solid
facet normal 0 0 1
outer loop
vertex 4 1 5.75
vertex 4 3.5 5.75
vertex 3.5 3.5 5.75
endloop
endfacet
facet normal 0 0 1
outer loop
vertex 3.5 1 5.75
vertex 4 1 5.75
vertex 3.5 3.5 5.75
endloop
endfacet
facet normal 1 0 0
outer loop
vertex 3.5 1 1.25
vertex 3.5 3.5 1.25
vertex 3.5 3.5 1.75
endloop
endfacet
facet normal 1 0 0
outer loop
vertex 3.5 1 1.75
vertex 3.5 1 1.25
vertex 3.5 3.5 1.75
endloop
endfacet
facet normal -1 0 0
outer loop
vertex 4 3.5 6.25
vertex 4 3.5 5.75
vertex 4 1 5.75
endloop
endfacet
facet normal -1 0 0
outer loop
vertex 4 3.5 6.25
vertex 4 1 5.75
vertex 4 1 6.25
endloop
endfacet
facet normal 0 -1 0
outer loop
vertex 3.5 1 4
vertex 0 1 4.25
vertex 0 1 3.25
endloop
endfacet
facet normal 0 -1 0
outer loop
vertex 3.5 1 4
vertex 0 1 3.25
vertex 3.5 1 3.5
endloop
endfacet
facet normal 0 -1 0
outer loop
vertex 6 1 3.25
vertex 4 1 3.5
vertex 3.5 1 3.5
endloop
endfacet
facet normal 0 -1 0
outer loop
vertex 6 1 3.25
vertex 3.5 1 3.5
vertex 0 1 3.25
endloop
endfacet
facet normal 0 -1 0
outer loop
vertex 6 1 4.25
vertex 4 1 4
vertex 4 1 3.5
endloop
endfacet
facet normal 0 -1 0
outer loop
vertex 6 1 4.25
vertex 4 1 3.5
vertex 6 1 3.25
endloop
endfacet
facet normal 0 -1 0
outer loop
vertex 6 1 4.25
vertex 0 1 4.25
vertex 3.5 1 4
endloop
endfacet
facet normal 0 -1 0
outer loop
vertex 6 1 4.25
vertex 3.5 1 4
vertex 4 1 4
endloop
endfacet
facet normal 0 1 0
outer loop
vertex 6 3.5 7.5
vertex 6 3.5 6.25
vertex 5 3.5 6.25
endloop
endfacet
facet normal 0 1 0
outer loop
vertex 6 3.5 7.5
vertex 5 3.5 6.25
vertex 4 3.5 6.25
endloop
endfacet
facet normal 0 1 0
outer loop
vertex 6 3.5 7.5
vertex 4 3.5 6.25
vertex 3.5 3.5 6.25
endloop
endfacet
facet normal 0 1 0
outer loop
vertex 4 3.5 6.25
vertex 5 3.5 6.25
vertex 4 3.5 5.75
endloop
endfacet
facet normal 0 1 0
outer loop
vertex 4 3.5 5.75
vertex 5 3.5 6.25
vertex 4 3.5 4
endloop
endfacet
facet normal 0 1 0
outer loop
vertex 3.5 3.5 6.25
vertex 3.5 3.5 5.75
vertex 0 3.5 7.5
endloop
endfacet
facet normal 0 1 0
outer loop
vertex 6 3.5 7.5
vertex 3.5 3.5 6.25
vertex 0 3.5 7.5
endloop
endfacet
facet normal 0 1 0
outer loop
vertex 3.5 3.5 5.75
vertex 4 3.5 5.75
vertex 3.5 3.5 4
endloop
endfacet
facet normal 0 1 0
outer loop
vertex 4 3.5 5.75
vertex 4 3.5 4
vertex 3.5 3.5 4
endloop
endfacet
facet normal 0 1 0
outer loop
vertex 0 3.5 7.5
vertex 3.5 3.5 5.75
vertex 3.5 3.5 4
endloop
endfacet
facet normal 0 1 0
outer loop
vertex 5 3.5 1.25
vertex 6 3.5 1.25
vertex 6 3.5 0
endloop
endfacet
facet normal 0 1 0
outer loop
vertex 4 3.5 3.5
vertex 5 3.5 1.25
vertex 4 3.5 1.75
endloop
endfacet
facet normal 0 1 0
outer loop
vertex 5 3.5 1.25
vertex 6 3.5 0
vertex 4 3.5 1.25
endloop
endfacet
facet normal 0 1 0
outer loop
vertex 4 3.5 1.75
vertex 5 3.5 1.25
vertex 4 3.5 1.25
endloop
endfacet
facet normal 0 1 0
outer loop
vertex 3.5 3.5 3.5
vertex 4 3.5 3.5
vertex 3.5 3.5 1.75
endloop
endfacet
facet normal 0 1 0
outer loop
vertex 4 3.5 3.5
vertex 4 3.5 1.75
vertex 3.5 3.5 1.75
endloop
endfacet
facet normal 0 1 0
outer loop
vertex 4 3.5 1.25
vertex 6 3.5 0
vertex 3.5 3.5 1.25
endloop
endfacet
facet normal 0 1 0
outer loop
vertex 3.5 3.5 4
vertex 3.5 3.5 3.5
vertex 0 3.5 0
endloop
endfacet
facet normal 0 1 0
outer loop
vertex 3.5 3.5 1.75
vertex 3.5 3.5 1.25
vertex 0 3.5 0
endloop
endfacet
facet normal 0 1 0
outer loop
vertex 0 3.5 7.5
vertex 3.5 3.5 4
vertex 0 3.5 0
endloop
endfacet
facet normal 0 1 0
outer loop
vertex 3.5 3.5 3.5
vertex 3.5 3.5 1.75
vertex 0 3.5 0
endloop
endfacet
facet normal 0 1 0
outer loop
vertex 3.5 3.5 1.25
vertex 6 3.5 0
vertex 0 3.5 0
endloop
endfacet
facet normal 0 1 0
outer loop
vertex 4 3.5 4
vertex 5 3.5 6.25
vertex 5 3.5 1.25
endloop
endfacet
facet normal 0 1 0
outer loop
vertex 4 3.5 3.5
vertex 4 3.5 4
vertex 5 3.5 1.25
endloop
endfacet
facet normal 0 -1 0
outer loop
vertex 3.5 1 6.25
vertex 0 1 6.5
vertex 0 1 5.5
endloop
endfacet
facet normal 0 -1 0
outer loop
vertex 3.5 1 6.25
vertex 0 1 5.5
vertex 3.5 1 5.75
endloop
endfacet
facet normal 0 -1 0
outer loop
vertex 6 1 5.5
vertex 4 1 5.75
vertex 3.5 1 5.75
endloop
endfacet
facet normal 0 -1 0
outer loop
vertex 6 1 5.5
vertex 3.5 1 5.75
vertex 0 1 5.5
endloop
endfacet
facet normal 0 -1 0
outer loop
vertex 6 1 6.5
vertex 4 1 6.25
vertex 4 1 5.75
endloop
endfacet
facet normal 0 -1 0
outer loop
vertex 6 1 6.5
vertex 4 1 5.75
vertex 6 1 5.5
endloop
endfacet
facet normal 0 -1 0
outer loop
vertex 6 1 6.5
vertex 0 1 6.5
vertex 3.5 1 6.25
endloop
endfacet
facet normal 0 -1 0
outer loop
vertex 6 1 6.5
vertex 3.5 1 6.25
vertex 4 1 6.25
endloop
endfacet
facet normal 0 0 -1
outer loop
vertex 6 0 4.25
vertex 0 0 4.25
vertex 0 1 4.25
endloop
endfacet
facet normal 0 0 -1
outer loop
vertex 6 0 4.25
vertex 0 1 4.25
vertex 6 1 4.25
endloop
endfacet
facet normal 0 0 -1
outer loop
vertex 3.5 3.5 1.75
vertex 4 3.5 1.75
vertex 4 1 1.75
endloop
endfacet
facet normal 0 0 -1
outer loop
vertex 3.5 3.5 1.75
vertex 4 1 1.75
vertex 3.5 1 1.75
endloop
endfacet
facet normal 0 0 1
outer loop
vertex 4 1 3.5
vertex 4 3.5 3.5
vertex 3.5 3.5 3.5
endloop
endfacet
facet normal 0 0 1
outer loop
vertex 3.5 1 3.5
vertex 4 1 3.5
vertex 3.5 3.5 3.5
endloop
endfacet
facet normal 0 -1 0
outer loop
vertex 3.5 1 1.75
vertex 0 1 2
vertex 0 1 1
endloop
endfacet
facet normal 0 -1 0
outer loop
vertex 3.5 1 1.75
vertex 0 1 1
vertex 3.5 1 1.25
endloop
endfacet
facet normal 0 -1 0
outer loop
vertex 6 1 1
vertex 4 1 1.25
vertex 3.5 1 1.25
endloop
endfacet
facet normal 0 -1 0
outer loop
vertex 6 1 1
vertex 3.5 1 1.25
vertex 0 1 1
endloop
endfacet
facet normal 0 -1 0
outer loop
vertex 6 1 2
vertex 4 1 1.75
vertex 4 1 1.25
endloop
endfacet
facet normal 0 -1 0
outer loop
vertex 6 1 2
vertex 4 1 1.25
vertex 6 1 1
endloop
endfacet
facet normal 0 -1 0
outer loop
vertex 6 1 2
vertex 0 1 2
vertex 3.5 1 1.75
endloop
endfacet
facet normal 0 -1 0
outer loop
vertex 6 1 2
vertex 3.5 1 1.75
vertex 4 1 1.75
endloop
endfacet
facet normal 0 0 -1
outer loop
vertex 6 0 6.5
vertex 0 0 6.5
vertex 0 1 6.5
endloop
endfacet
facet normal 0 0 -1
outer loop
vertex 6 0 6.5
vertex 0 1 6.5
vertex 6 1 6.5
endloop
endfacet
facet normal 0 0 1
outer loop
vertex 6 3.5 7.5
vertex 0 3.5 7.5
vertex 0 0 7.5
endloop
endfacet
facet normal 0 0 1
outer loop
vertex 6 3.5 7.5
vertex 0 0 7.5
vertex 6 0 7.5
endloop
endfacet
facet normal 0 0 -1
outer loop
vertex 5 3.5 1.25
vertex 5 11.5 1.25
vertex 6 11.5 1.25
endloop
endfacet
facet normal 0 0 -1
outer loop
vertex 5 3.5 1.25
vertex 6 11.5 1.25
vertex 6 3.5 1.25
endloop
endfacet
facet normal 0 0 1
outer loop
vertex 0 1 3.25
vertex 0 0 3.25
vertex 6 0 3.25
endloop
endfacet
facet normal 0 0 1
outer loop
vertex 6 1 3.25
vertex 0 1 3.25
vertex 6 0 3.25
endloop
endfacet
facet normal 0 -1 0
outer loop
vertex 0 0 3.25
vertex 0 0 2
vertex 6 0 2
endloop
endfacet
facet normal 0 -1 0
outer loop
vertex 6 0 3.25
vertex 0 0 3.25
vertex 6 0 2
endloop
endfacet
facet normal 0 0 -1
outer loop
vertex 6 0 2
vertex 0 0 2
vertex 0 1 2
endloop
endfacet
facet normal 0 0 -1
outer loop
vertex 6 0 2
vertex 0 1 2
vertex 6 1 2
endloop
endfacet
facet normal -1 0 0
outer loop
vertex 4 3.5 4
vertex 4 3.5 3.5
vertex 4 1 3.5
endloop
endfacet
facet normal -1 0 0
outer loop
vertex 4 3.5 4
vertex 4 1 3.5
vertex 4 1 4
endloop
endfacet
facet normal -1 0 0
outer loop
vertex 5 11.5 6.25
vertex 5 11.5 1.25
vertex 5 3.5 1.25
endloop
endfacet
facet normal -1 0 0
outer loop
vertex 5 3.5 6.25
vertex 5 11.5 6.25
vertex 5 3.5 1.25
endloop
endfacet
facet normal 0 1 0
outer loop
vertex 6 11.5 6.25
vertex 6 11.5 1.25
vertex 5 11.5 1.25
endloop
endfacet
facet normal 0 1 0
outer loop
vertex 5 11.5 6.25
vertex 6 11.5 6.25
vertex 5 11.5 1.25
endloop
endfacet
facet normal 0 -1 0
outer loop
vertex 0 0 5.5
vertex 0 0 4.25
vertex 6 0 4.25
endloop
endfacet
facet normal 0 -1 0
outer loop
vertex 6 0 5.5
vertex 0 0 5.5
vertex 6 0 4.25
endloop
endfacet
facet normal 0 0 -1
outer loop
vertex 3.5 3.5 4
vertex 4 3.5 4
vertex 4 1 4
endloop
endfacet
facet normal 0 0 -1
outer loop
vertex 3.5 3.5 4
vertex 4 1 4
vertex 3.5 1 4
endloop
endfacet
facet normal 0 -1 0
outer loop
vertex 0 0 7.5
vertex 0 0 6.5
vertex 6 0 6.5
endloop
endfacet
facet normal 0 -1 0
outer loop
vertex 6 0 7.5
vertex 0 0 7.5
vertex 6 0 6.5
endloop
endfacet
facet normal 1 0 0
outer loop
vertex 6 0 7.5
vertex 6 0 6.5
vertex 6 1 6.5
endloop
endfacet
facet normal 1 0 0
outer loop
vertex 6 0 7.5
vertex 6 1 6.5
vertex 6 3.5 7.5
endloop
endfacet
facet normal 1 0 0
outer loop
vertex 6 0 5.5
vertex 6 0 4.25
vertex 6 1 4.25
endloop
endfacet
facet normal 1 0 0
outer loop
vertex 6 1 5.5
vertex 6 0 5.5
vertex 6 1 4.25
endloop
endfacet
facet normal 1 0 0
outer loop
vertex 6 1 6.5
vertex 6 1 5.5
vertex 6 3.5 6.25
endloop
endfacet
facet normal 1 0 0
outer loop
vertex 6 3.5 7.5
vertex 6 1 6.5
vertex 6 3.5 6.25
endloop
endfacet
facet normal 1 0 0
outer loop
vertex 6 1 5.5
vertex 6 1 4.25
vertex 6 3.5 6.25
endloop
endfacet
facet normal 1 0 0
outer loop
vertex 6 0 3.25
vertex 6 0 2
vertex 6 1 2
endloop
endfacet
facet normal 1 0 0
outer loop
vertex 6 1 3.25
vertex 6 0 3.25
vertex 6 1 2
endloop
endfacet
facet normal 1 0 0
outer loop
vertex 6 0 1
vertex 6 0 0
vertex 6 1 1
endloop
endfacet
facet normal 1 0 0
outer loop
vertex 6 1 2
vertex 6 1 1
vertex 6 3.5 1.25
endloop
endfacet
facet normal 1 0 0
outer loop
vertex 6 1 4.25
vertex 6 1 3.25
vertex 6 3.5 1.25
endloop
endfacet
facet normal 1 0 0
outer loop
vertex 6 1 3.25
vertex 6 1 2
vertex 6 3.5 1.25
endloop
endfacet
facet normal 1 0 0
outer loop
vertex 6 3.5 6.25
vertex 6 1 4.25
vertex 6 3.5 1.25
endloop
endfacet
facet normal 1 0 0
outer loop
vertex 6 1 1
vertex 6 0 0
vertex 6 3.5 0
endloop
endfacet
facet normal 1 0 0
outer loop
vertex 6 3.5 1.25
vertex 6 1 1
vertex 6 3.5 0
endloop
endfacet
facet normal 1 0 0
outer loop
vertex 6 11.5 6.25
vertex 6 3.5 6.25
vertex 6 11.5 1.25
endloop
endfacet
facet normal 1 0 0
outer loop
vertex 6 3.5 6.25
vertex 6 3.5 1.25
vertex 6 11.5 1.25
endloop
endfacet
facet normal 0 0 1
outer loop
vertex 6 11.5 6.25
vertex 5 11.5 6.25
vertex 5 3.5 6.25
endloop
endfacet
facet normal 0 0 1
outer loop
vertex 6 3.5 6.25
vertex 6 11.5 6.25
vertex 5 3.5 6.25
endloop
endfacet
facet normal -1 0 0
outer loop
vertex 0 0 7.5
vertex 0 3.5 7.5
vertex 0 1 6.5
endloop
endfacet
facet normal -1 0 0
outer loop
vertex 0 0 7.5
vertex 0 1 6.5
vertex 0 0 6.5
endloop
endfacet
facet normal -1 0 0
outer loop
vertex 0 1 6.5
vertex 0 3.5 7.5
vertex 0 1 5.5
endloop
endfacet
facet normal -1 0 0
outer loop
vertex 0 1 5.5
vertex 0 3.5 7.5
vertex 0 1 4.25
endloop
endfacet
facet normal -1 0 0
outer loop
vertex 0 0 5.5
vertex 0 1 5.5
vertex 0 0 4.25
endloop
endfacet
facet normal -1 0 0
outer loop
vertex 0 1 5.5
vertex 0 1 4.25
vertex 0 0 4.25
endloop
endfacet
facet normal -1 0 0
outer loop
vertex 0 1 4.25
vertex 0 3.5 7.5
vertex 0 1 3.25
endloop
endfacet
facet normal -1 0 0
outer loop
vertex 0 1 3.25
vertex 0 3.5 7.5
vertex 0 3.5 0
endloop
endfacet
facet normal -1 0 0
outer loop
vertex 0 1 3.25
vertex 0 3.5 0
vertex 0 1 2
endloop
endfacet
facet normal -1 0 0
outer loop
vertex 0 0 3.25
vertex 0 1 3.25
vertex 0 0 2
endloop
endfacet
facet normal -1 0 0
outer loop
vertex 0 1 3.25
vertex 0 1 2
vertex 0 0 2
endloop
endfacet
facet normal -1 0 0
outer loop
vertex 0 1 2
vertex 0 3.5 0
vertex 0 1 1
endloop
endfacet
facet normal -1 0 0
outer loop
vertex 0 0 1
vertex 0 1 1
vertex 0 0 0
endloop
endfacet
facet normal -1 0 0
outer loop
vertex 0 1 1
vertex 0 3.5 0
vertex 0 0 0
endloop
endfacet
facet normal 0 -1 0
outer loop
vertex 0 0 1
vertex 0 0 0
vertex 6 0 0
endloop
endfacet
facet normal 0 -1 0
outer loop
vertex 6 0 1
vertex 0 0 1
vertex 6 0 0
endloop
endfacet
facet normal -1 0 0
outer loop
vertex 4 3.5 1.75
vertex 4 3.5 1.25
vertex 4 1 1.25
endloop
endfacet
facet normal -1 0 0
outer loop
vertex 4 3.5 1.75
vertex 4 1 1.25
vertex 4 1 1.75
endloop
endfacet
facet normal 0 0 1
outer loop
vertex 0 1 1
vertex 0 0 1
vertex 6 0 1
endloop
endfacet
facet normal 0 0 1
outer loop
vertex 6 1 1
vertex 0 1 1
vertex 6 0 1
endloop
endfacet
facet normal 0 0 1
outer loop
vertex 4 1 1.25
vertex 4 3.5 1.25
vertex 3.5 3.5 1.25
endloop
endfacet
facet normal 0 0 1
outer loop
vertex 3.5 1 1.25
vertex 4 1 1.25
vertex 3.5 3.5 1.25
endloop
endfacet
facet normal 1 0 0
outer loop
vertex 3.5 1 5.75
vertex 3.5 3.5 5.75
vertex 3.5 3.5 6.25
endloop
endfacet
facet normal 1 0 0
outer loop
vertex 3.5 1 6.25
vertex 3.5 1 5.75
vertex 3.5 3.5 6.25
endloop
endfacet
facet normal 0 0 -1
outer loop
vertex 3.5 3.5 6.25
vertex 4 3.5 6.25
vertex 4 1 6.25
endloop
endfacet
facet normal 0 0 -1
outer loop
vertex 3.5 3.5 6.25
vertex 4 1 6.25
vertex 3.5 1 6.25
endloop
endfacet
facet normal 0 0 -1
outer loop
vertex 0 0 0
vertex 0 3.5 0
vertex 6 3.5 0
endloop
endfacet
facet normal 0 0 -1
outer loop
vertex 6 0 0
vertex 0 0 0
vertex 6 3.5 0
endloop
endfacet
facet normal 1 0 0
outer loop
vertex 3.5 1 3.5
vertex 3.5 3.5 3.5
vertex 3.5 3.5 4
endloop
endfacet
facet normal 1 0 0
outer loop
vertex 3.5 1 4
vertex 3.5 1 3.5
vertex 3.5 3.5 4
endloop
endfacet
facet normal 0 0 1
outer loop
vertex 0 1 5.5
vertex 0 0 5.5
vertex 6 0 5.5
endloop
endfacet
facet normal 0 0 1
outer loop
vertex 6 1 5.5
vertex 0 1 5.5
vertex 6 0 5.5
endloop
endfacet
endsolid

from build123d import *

# Parameters (mm, degrees)
F1_DEPTH = 7.5
F2_W     = 8
F2_H     = 1.25
F3_DEPTH = 25
F4_W     = 0.5
F4_H     = 0.5
F5_DEPTH = 25
F6_W     = 6
F6_H     = 1
F7_DEPTH = 1


with BuildPart() as f1:
    # F0 (on Top) → F1 (new body)
    with BuildSketch(Plane.XY):
        Polygon((0, 3.5), (0, 0), (6, 0), (6, 11.5), (5, 11.5), (5, 3.5), align=None)
    extrude(amount=F1_DEPTH)

    # F2 (on face) → F3 (cut)
    with BuildSketch(Plane(origin=(5, 0, 0), x_dir=(0, -1, 0), z_dir=(-1, 0, 0))):
        with Locations((-7.5, 0.625)):
            Rectangle(F2_W, F2_H)
        with Locations((-7.5, 6.875)):
            Rectangle(F2_W, F2_H)
    extrude(amount=-F3_DEPTH, mode=Mode.SUBTRACT)

    # F4 (on face) → F5 (cut)
    with BuildSketch(Plane(origin=(0, 3.5, 0), x_dir=(-1, 0, 0), z_dir=(0, 1, 0))):
        with Locations((-3.75, 6)):
            Rectangle(F4_W, F4_H)
        with Locations((-3.75, 1.5)):
            Rectangle(F4_W, F4_H)
        with Locations((-3.75, 3.75)):
            Rectangle(F4_W, F4_H)
    extrude(amount=-F5_DEPTH, mode=Mode.SUBTRACT)

    # F6 (on face) → F7 (cut)
    with BuildSketch(Plane.XZ):
        with Locations((3, 6)):
            Rectangle(F6_W, F6_H)
        with Locations((3, 3.75)):
            Rectangle(F6_W, F6_H)
        with Locations((3, 1.5)):
            Rectangle(F6_W, F6_H)
    extrude(amount=-F7_DEPTH, mode=Mode.SUBTRACT)


solid = f1.part
